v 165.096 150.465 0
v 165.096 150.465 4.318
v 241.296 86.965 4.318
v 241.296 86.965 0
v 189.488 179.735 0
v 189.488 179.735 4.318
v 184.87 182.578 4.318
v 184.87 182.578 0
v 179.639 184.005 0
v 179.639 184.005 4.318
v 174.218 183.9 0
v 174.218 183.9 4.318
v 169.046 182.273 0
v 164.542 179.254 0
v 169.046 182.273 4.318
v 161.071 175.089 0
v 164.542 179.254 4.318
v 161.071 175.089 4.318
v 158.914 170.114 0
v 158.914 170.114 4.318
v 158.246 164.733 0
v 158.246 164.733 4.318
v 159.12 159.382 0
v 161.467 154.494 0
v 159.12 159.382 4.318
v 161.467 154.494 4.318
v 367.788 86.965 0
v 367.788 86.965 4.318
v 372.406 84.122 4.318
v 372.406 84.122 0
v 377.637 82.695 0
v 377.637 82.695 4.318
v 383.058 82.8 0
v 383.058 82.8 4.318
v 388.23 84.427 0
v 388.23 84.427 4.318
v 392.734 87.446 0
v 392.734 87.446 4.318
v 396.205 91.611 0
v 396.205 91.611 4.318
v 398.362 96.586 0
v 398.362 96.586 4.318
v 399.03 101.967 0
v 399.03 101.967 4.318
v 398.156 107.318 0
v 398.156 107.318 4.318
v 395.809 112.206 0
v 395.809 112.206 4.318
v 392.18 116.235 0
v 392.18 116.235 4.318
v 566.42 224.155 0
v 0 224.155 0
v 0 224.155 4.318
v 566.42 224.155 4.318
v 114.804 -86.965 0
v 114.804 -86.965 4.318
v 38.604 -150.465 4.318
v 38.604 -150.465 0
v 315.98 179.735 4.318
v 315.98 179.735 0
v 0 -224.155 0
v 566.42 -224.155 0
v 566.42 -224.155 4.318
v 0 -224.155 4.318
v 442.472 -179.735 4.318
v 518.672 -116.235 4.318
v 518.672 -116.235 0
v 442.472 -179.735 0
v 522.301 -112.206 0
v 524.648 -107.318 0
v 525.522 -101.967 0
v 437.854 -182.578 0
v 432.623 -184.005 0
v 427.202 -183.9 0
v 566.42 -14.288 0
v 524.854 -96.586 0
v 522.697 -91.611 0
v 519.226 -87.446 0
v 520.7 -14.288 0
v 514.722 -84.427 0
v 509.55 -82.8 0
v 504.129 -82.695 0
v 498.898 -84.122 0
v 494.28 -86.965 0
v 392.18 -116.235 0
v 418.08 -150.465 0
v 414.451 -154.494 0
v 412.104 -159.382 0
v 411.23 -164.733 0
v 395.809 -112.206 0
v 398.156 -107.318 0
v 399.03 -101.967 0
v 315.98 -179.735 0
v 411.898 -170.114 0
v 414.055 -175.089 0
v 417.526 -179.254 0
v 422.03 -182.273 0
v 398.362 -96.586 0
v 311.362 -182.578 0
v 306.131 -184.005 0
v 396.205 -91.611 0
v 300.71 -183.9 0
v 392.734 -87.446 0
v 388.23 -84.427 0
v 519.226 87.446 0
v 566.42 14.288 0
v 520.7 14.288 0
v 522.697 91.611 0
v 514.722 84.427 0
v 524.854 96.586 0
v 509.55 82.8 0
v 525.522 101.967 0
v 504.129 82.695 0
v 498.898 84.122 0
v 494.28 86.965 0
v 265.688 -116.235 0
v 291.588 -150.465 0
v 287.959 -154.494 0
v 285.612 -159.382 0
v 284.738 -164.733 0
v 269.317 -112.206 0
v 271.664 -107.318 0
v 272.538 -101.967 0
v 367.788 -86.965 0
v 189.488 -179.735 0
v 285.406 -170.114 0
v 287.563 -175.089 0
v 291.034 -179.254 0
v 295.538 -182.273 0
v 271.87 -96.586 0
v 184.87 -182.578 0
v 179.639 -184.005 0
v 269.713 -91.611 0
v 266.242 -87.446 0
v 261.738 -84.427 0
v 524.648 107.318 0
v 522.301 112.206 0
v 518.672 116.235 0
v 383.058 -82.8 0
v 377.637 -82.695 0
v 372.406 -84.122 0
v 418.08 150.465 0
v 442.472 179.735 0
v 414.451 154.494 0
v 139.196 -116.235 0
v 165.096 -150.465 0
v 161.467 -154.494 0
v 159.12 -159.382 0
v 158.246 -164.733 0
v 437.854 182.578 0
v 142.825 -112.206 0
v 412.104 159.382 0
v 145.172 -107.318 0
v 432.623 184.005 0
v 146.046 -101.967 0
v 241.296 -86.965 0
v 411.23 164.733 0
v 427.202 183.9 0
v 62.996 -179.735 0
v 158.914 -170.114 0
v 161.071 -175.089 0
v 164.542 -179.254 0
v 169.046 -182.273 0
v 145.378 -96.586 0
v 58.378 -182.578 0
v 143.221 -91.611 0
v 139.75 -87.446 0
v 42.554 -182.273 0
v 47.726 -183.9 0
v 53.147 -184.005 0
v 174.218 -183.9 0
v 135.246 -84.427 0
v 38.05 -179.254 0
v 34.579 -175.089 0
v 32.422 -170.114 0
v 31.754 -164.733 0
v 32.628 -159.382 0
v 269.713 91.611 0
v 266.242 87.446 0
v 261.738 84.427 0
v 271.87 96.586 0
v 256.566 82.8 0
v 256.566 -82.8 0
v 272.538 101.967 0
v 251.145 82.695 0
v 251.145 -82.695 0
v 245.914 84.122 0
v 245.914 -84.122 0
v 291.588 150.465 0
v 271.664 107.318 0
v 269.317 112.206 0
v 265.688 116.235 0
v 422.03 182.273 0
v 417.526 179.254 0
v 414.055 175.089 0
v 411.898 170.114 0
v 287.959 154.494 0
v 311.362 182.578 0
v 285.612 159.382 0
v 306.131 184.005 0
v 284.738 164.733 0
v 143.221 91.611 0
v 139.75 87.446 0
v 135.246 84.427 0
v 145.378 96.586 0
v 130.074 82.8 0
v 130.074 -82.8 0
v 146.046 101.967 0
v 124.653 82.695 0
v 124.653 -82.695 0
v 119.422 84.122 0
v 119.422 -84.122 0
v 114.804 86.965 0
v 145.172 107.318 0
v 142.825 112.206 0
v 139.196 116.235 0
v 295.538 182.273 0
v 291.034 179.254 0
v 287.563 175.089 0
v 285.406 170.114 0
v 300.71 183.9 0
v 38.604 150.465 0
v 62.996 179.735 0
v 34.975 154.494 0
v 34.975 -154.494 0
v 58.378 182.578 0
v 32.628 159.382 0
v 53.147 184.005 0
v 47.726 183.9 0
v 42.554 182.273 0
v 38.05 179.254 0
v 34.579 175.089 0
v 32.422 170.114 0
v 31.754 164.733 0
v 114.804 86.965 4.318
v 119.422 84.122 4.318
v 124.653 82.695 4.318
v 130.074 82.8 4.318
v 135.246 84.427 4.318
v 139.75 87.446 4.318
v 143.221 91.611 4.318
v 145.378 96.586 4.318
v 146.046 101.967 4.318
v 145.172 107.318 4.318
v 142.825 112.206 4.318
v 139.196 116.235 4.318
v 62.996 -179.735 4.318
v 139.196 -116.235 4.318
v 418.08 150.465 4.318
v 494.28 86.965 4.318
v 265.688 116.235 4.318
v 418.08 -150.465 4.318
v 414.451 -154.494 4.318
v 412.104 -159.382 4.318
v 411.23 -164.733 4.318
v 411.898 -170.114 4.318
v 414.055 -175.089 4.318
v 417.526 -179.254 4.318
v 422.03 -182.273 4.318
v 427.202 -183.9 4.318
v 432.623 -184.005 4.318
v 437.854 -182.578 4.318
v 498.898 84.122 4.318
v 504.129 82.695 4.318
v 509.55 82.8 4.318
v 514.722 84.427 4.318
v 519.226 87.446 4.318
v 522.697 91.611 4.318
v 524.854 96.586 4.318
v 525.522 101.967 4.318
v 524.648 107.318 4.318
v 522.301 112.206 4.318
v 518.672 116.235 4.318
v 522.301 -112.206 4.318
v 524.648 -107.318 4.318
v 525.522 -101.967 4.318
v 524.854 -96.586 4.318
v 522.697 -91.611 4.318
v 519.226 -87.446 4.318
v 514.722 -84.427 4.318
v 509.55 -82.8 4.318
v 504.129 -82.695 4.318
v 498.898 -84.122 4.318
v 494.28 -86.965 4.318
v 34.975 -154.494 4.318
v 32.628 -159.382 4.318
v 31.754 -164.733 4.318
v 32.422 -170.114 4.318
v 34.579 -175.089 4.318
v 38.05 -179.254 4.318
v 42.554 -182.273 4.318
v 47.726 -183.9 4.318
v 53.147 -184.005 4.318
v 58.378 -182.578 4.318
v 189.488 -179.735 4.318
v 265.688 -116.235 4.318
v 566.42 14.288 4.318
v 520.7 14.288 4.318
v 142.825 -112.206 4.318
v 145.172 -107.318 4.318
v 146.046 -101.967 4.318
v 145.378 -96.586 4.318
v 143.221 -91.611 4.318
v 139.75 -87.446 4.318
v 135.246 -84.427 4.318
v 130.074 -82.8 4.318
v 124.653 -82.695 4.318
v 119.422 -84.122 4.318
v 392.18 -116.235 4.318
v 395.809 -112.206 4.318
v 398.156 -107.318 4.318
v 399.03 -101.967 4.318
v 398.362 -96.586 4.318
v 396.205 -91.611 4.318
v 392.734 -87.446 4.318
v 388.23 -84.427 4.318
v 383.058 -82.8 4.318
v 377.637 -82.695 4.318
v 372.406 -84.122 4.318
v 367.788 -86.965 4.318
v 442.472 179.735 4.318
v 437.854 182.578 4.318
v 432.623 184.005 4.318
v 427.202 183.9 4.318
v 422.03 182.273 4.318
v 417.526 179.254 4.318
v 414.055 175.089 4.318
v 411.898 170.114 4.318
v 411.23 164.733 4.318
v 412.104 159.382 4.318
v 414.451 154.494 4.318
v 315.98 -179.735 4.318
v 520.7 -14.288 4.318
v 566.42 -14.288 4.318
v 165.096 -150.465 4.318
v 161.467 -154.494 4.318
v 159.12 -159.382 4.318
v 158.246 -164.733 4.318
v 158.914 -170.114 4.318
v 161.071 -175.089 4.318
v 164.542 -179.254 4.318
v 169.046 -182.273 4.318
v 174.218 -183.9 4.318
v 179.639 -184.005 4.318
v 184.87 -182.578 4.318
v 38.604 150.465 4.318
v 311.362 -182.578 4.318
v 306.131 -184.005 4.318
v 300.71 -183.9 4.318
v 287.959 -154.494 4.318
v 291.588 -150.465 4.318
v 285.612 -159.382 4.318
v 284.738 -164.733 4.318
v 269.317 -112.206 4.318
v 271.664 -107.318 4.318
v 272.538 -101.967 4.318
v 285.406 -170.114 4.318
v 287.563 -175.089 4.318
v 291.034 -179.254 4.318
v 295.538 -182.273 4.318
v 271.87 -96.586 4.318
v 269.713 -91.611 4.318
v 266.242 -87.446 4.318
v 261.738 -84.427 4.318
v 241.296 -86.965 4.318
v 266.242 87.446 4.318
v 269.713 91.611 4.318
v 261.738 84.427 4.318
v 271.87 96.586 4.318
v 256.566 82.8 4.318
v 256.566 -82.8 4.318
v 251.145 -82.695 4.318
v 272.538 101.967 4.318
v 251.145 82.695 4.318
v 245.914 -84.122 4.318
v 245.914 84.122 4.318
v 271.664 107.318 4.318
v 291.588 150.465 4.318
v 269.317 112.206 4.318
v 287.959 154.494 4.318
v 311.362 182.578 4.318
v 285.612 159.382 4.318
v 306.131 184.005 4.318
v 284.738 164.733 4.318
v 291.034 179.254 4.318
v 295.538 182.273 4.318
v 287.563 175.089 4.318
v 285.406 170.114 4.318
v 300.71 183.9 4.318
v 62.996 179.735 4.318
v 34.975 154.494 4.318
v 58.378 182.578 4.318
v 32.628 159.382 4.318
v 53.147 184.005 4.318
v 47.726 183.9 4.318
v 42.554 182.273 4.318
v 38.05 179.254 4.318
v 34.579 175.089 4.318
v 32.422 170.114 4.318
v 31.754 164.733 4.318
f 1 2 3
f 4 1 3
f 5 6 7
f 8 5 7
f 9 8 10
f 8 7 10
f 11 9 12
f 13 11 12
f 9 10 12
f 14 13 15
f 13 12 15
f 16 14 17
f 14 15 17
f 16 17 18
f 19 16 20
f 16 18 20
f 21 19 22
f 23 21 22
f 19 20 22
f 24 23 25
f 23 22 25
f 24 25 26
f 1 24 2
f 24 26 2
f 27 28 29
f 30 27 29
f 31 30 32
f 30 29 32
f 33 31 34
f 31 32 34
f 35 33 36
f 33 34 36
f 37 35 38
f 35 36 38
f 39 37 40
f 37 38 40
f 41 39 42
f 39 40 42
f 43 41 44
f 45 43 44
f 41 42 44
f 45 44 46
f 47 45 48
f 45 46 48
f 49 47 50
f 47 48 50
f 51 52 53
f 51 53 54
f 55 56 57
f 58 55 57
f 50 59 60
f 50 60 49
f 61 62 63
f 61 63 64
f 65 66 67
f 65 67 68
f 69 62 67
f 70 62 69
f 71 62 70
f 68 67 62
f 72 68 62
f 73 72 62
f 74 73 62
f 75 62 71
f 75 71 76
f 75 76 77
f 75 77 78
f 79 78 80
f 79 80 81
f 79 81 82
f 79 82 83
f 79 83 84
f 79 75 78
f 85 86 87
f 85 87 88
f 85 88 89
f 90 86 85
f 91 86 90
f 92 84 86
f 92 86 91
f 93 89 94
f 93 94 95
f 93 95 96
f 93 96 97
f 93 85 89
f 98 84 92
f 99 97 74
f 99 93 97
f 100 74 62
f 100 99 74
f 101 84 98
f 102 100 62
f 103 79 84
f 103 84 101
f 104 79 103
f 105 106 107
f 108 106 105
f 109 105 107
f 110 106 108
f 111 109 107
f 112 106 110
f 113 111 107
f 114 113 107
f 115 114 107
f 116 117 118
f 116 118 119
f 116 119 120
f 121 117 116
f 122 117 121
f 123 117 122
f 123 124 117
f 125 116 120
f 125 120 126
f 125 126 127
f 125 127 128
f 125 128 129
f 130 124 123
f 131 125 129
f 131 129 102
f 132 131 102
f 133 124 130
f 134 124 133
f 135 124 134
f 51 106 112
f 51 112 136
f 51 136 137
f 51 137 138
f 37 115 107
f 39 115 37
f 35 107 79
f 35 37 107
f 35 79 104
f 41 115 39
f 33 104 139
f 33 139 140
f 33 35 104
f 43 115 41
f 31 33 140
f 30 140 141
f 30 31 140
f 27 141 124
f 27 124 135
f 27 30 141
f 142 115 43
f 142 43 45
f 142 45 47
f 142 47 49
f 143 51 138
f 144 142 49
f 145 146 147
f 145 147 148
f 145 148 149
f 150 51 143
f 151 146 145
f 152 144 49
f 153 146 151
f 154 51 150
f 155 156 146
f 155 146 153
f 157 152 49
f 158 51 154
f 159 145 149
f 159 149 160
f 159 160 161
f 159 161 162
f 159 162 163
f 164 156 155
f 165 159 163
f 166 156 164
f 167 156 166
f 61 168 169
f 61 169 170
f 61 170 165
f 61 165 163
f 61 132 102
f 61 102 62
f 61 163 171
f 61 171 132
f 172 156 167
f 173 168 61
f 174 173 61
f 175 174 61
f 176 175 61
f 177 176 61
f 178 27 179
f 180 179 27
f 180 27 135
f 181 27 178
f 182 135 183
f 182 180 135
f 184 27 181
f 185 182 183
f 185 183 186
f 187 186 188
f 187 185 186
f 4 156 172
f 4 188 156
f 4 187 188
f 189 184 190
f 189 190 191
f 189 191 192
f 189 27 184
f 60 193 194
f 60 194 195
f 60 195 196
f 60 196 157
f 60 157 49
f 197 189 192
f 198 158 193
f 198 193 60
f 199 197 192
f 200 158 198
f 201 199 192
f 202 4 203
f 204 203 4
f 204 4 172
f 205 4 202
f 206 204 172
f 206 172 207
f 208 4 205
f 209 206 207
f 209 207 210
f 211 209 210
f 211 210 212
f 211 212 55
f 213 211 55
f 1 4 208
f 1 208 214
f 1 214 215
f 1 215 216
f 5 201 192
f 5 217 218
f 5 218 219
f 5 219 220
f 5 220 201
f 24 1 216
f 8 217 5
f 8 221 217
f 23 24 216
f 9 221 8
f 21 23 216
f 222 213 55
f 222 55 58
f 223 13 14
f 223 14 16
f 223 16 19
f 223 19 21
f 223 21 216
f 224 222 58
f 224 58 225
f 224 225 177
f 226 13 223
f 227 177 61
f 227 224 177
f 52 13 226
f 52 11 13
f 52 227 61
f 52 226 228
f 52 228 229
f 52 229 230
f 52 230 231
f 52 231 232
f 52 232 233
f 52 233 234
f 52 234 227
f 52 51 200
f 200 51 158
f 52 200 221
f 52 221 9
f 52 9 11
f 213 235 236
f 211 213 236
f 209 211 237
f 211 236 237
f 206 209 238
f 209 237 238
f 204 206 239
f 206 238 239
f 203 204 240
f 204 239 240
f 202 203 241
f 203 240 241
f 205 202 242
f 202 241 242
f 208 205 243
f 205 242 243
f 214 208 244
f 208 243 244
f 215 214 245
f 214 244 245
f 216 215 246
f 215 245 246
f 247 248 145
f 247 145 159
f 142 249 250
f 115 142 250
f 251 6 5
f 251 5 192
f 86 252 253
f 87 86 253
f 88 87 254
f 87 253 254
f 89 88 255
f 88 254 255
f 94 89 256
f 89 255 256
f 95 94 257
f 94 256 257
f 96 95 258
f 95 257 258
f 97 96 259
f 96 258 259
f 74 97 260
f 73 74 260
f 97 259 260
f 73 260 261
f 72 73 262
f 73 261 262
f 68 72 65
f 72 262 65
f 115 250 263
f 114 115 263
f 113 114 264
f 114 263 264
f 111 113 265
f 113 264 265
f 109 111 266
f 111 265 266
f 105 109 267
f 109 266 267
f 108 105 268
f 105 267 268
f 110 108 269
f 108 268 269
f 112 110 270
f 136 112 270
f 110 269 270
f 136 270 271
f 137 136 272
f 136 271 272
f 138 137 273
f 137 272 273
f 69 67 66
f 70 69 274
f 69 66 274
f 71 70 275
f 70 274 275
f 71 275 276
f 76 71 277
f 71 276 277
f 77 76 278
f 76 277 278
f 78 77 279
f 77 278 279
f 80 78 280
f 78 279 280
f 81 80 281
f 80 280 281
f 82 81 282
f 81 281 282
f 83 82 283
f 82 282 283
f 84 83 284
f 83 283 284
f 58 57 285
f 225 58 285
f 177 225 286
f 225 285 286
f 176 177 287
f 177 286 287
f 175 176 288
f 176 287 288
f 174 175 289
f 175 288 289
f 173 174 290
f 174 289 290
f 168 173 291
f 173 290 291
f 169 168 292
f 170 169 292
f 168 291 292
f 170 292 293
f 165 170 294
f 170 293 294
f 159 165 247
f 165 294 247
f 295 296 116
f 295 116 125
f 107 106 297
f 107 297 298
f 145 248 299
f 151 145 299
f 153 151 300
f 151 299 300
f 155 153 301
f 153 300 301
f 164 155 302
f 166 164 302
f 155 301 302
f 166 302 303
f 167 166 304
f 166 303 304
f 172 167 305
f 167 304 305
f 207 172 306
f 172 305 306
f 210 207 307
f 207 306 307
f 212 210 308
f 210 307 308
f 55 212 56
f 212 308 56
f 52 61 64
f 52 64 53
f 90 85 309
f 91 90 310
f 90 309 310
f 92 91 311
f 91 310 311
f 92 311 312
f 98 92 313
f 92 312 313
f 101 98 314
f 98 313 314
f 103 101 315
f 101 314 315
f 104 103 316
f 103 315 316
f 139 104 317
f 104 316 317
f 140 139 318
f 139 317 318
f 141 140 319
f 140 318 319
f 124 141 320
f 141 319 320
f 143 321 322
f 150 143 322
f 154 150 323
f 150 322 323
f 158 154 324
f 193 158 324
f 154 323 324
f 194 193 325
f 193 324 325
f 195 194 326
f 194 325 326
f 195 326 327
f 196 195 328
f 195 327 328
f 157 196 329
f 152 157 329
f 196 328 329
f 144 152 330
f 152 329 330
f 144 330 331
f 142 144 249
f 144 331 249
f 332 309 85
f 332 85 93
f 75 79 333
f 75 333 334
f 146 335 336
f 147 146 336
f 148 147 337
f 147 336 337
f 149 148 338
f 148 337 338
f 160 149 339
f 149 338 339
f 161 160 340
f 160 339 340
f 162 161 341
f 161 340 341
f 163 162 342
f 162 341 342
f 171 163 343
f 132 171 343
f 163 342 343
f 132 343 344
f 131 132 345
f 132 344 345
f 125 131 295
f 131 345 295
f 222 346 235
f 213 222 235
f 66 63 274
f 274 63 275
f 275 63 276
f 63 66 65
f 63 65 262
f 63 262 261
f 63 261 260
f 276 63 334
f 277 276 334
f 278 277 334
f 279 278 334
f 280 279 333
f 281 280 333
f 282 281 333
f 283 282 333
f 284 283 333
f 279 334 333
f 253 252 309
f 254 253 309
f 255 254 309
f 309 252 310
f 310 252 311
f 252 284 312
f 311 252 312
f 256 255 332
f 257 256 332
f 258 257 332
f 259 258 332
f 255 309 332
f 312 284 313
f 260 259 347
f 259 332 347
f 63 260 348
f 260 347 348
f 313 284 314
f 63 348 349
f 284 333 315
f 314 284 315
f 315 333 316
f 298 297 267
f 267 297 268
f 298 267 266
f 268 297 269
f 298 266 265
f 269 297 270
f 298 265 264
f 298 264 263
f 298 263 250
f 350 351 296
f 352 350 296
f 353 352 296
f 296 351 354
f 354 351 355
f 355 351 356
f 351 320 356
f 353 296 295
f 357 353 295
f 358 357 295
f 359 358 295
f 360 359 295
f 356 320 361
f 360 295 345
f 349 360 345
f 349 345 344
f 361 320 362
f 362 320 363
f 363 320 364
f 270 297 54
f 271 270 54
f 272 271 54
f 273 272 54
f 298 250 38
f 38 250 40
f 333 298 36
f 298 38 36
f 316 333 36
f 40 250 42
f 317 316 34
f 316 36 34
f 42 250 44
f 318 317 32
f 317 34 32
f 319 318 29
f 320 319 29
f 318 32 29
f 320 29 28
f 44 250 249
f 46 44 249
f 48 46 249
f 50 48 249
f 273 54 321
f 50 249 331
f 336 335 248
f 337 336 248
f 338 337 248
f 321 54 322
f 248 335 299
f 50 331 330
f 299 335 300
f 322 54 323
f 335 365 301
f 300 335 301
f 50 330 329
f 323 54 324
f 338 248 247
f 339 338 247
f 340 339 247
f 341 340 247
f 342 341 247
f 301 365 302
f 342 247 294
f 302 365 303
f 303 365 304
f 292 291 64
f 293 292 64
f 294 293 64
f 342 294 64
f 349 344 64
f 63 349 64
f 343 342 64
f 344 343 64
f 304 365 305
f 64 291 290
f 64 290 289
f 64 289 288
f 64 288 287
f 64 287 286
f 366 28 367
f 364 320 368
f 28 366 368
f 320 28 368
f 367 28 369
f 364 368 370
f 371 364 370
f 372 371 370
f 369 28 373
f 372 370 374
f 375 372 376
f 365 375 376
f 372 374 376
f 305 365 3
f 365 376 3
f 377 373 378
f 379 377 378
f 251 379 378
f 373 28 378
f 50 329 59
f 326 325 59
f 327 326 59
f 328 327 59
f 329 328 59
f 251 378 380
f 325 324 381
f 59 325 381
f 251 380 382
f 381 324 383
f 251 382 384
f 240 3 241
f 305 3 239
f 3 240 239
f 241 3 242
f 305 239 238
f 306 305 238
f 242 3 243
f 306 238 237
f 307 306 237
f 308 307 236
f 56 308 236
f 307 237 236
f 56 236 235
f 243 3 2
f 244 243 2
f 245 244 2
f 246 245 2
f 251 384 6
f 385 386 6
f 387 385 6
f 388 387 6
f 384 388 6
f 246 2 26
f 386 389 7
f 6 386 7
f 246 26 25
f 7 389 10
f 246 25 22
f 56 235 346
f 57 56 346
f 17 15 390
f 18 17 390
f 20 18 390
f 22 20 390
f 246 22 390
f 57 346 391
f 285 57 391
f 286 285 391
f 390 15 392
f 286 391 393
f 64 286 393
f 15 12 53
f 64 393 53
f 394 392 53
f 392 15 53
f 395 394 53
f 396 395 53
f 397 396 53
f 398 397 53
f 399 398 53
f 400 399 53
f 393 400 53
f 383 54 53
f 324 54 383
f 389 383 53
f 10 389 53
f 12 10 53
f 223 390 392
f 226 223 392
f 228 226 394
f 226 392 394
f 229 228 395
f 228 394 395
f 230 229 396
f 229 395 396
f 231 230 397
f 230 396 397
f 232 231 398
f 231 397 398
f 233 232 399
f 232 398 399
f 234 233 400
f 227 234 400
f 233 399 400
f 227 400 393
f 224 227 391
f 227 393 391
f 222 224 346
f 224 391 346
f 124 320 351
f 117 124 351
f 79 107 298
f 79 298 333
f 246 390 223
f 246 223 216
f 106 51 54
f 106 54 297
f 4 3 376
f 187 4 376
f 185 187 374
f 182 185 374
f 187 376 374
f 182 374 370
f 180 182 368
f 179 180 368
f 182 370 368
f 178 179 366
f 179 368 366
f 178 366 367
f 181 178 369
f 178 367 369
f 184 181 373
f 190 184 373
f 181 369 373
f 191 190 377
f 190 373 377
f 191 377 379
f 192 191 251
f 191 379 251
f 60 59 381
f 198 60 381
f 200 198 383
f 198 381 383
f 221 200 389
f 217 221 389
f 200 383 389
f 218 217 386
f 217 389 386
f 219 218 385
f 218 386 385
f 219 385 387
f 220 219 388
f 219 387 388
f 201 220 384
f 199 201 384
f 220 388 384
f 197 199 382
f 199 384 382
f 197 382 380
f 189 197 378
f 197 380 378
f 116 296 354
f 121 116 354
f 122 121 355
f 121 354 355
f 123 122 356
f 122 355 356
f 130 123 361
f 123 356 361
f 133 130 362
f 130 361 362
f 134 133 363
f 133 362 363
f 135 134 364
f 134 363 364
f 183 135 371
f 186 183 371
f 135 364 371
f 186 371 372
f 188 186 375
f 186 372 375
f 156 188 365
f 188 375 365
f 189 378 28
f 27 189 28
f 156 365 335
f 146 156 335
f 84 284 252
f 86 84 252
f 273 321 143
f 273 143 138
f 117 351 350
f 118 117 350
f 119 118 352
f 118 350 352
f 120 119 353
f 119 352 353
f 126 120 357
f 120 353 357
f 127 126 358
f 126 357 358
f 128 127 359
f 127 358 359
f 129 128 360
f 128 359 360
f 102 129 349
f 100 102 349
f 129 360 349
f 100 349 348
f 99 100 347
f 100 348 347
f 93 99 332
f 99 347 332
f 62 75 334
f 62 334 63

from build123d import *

# Parameters (mm, degrees)
PAD_DEPTH           = 4.318
POCKET_DEPTH        = 5.08
LINEARPATTERN_COUNT = 4
LINEARPATTERN_PITCH = 126.492


with BuildPart() as part:
    # Sketch → Pad (new body)
    with BuildSketch(Plane.XY):
        Polygon((0, 224.155), (566.42, 224.155), (566.42, 14.2875), (520.7, 14.2875), (520.7, -14.2875), (566.42, -14.2875), (566.42, -224.155), (0, -224.155), align=None)
    extrude(amount=PAD_DEPTH)

    # Sketch001 (on Face10 of Pad) → Pocket (cut)
    with BuildSketch(Plane.XY.offset(4.318)):
        with BuildLine():
            ThreePointArc((62.995513, 179.734615), (36.165385, 177.295513), (38.604487, 150.465385))
            Line((38.604487, 150.465385), (114.804487, 86.965385))
            ThreePointArc((114.804487, 86.965385), (141.634615, 89.404487), (139.195513, 116.234615))
            Line((62.995513, 179.734615), (139.195513, 116.234615))
        make_face()
        with BuildLine():
            ThreePointArc((139.195513, -116.234615), (141.634615, -89.404487), (114.804487, -86.965385))
            Line((114.804487, -86.965385), (38.604487, -150.465385))
            ThreePointArc((38.604487, -150.465385), (36.165385, -177.295513), (62.995513, -179.734615))
            Line((139.195513, -116.234615), (62.995513, -179.734615))
        make_face()
    pocket = extrude(amount=-POCKET_DEPTH, mode=Mode.SUBTRACT)

    # LinearPattern: Pocket ×4
    with Locations(*[(i * LINEARPATTERN_PITCH, 0, 0) for i in range(1, LINEARPATTERN_COUNT)]):
        add(pocket, mode=Mode.SUBTRACT)


solid = part.part
